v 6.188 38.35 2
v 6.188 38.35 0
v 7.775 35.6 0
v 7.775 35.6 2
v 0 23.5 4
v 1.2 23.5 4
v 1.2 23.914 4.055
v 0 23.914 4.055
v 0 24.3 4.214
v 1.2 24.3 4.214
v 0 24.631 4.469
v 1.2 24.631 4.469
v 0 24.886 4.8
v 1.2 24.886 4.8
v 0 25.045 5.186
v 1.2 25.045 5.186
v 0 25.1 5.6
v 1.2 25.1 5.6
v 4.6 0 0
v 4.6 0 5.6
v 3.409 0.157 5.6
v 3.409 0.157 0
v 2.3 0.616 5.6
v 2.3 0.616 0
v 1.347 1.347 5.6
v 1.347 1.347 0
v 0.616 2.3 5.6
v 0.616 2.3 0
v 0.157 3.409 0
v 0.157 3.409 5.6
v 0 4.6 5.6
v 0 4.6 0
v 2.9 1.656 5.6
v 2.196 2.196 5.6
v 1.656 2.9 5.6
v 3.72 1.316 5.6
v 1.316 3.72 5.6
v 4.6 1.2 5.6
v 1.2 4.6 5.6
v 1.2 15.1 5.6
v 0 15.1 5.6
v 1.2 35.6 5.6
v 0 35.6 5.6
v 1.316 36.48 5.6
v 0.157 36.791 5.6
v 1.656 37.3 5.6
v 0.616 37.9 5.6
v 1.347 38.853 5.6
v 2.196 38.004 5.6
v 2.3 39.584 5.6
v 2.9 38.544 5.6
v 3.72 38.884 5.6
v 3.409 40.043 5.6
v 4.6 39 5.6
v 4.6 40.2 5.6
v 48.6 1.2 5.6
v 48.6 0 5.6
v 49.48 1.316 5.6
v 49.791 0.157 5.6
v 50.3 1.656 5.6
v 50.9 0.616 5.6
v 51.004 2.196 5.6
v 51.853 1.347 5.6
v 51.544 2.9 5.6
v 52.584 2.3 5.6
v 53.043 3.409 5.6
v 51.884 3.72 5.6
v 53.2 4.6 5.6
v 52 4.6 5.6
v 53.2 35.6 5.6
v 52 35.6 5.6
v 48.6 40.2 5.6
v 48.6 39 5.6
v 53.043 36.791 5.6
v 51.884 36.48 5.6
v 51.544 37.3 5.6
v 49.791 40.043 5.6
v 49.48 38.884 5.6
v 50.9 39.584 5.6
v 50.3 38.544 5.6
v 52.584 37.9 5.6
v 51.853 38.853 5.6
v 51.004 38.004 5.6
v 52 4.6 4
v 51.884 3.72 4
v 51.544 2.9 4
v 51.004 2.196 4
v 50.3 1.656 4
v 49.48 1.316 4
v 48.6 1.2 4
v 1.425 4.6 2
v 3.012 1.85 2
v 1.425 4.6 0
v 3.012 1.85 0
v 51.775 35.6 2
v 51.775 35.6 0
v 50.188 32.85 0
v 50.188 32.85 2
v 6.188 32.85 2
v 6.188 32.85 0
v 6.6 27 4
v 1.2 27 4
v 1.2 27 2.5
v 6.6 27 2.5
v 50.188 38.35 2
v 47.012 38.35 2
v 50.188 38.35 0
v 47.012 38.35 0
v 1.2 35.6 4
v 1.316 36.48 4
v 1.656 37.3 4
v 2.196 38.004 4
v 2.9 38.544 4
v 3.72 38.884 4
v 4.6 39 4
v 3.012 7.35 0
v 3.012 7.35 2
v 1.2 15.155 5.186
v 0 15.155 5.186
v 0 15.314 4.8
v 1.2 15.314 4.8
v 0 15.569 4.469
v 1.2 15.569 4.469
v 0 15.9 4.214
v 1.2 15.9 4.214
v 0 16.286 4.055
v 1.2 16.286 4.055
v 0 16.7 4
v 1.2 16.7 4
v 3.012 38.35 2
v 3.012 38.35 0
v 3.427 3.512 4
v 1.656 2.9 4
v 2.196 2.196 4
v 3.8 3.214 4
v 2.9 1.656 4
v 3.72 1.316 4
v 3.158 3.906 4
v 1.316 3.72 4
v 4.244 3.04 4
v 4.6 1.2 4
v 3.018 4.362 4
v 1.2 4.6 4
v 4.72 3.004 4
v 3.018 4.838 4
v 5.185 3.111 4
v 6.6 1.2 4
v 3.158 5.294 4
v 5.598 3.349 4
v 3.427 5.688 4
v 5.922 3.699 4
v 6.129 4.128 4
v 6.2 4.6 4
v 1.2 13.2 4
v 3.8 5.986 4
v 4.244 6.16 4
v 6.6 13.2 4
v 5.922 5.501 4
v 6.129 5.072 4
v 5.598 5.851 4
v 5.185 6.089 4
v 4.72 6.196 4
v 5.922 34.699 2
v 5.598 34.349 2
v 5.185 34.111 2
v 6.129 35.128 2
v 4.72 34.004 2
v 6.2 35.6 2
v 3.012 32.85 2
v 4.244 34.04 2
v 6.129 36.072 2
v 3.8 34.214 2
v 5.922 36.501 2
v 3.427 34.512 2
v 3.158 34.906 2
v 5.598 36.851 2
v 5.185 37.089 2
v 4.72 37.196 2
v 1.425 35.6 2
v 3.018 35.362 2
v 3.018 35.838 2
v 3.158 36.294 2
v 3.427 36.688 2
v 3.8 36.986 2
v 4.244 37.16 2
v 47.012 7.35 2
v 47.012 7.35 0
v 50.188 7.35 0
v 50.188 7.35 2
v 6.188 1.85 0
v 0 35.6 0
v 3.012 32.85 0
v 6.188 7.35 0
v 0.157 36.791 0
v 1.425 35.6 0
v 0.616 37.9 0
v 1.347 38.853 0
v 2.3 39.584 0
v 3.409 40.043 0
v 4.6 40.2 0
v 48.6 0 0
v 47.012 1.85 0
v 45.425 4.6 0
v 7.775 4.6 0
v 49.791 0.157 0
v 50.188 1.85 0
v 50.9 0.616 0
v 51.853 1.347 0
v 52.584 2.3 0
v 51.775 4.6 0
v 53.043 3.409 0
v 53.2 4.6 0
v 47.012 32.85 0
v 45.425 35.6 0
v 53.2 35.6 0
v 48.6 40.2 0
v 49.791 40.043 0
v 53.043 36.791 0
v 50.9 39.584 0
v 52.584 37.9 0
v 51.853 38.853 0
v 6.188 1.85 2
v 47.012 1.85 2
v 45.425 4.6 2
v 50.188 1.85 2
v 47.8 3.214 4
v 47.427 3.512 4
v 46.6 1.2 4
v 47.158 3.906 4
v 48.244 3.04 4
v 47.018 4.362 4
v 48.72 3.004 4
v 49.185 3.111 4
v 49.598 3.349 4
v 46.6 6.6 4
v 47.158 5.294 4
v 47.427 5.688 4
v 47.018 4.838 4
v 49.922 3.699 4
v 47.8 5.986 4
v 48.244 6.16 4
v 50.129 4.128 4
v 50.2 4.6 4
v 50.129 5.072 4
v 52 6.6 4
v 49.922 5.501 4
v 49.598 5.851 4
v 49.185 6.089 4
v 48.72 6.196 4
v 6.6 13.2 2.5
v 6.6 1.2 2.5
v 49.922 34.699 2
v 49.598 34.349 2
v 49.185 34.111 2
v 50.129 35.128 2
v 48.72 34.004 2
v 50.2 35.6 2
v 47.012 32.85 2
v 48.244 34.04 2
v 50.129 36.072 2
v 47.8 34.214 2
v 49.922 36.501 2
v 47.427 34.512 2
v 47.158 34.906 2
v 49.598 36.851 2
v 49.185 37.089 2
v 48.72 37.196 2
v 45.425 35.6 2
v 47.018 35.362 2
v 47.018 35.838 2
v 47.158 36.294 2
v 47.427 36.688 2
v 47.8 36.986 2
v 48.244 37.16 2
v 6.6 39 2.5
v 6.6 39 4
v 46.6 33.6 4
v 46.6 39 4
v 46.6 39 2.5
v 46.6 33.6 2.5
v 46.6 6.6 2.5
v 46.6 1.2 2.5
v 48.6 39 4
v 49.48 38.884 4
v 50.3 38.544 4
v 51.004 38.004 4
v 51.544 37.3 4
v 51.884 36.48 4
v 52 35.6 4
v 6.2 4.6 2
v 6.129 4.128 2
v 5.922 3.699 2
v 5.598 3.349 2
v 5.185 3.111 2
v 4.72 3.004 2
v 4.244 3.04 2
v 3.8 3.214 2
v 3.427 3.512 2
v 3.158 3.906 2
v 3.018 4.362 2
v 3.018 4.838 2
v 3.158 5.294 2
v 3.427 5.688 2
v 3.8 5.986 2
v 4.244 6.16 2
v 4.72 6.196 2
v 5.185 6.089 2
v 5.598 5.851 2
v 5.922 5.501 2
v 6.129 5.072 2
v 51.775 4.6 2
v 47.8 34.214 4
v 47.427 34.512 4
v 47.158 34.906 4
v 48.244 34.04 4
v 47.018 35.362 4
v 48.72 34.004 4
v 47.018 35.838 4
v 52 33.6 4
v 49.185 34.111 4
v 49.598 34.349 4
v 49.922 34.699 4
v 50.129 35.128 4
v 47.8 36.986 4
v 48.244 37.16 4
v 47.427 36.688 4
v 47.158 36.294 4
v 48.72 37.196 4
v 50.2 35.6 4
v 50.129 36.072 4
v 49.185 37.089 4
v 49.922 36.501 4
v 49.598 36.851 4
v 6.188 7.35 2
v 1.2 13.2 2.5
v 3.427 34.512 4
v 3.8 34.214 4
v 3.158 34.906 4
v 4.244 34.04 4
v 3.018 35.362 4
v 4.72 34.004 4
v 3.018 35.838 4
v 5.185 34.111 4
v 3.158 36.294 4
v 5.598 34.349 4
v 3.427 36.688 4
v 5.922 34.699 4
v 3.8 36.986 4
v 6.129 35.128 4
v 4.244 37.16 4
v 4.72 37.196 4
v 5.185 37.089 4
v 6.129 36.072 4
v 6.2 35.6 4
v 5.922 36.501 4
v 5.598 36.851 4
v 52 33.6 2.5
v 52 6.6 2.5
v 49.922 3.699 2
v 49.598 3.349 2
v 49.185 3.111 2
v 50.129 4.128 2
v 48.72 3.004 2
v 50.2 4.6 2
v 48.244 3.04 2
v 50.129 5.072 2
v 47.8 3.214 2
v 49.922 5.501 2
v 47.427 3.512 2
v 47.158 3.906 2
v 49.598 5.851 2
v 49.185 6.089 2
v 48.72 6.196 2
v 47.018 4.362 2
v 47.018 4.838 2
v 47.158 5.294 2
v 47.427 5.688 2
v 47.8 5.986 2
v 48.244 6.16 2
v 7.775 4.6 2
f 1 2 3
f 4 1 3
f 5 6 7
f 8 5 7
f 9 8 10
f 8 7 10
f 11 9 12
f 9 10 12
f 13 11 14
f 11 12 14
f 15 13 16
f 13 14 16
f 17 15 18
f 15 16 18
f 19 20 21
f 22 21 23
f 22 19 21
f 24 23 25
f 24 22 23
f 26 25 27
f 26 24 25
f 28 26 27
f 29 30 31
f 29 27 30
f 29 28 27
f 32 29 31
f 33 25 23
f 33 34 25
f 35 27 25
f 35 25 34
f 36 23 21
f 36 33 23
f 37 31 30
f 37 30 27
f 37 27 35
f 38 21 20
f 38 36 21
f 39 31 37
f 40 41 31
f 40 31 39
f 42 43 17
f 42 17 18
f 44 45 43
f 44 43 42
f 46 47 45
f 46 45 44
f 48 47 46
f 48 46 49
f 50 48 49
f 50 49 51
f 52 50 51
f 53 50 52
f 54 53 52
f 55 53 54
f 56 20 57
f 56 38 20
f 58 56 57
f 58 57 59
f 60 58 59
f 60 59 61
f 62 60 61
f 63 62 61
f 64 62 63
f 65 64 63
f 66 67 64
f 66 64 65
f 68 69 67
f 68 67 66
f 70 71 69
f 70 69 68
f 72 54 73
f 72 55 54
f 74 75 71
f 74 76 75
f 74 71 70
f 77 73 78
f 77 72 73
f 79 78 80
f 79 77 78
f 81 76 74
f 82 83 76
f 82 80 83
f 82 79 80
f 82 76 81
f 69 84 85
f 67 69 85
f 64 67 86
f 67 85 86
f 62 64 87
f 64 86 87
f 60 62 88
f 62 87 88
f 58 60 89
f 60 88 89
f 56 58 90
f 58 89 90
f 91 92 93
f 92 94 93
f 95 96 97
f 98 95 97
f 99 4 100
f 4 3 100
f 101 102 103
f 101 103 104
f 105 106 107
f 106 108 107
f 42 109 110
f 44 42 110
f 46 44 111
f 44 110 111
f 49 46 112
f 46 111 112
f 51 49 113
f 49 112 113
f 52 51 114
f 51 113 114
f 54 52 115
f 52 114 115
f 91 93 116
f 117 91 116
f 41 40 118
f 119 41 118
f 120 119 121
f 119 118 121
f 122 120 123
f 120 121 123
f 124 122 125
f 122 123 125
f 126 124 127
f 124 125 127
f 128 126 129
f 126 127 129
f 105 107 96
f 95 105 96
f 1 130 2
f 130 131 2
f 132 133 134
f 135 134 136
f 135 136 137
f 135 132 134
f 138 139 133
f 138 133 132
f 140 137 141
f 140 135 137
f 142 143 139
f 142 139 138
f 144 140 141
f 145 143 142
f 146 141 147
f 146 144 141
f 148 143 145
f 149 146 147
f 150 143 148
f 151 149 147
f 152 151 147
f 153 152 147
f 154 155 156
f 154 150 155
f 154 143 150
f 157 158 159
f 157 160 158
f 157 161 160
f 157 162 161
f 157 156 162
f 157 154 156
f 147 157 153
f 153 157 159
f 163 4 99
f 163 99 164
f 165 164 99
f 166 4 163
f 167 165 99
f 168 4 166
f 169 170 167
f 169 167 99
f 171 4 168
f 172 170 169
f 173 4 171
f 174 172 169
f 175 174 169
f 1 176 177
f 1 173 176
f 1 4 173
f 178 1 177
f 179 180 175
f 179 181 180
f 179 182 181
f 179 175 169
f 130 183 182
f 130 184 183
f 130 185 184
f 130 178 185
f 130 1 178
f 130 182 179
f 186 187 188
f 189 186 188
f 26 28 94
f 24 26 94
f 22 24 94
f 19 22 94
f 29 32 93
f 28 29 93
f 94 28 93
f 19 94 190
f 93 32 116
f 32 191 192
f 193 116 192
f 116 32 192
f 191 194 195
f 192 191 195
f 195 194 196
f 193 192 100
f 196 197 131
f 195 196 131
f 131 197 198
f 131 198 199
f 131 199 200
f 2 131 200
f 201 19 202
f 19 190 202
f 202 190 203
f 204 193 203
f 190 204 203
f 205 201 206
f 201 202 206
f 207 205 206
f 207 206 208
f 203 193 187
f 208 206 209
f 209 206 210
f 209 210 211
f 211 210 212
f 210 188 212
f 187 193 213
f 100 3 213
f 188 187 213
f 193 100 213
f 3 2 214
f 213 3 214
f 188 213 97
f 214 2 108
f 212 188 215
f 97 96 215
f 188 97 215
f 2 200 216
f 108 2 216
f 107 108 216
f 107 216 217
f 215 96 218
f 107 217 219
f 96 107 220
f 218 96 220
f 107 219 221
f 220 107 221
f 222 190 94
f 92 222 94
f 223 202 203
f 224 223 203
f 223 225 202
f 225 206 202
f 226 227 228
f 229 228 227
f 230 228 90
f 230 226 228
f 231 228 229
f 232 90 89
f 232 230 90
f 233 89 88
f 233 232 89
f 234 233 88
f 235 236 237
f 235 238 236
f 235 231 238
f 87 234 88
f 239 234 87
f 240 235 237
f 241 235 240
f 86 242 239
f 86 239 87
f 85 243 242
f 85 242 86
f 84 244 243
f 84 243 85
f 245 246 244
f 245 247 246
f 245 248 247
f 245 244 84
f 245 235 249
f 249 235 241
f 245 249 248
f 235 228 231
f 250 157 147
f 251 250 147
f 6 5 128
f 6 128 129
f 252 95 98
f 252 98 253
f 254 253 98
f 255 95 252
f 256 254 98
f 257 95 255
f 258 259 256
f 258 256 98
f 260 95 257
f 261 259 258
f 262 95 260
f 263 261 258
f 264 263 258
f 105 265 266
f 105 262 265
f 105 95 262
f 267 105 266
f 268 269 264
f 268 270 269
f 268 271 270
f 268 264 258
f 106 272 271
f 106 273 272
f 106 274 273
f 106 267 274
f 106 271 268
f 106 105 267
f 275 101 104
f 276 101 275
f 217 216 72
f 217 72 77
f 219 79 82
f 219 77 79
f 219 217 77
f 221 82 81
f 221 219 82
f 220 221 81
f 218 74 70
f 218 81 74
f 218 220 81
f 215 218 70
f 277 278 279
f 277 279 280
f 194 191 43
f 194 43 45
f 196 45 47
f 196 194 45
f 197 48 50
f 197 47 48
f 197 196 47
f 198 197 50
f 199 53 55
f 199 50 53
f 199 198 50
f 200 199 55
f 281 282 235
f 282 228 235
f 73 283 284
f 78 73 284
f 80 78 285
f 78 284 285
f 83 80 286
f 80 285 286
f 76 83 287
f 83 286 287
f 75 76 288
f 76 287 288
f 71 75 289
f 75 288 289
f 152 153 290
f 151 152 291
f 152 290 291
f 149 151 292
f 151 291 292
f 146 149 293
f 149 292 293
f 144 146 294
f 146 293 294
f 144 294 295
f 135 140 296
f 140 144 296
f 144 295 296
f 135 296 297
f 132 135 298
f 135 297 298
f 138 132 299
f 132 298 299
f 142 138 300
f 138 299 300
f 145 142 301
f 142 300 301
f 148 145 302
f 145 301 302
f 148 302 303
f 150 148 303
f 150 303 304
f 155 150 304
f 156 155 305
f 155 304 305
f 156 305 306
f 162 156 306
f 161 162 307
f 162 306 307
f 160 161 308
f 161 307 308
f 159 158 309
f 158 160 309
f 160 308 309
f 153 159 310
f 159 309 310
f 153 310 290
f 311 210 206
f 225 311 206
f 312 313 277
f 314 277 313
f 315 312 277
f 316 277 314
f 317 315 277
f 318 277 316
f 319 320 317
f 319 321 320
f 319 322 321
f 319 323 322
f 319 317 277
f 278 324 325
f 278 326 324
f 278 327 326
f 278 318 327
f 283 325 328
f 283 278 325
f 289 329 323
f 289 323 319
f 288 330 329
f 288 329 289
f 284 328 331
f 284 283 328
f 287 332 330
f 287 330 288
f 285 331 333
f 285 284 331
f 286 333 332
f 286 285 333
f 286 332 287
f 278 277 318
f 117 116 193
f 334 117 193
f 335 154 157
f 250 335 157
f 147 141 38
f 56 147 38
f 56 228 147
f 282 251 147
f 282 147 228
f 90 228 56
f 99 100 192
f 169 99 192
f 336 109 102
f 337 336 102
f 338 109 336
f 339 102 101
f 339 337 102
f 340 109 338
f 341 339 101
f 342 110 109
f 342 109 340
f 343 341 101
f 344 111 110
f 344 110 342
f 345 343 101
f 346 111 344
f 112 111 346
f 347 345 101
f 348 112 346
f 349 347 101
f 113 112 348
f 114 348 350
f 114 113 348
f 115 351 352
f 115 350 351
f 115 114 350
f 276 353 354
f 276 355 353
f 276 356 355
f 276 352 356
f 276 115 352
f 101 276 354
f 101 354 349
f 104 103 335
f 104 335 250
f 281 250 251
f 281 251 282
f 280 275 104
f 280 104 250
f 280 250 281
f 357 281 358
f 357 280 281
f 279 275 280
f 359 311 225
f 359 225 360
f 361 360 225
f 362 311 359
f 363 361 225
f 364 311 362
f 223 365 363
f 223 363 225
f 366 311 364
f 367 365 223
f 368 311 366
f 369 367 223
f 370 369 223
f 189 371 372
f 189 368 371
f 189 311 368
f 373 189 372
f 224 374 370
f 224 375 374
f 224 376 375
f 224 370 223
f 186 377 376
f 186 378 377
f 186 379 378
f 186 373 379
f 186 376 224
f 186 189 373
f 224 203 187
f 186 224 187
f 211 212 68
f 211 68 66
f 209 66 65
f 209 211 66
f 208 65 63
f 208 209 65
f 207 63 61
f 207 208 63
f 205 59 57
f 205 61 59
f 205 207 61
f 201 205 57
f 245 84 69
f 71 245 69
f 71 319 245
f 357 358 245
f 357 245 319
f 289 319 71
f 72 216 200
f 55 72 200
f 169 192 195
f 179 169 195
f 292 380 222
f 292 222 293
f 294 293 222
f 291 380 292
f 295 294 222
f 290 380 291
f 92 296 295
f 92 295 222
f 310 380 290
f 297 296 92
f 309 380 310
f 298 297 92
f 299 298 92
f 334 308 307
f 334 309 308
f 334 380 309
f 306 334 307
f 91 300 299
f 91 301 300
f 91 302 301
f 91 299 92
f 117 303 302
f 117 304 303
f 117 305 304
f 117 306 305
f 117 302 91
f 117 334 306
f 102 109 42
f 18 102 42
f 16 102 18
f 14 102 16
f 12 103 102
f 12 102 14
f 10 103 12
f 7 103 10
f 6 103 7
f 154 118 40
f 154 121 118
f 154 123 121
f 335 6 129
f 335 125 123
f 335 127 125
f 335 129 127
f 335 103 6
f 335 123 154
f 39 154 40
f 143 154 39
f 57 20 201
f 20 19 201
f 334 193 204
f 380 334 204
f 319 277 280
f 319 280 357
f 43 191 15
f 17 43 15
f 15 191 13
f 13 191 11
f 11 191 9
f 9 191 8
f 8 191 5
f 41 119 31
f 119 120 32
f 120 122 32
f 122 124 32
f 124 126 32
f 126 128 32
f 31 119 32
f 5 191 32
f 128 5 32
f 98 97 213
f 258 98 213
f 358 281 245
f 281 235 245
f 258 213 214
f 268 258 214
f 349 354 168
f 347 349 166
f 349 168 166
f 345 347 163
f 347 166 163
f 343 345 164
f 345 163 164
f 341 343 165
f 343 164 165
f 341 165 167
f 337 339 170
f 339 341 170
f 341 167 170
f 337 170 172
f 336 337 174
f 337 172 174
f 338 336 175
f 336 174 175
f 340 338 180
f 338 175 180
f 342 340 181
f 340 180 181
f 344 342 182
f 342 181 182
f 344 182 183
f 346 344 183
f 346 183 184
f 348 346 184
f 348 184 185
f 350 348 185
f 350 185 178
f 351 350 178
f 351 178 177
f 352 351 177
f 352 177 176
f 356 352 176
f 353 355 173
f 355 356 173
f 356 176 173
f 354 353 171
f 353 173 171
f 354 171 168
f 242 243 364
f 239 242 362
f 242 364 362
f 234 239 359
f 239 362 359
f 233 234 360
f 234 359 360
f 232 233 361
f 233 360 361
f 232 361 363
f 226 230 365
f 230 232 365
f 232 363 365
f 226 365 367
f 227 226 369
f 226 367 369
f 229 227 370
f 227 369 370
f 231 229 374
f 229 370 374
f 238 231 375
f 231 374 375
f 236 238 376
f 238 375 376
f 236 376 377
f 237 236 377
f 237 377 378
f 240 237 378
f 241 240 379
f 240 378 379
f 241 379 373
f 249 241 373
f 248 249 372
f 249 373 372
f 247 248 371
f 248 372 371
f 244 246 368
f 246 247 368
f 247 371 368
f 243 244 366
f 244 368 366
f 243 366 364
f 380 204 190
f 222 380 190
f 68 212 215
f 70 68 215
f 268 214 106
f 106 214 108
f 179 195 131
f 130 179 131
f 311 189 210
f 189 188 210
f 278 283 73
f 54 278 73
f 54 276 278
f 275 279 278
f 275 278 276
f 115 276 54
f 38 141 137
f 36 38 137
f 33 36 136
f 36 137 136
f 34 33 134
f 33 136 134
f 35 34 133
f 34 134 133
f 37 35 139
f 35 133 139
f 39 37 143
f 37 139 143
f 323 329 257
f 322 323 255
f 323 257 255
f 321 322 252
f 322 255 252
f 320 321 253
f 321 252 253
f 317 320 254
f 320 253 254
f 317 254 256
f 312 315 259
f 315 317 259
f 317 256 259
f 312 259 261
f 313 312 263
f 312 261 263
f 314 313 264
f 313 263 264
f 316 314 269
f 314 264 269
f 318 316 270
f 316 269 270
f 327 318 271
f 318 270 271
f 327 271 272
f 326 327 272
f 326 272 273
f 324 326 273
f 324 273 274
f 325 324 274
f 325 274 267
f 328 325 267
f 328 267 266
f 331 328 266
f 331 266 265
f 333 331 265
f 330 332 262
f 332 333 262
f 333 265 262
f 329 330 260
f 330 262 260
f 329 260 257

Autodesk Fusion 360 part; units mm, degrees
sketch "Sketch1" plane through (0, 0, 0) normal (0, 0, 1) x (1, 0, 0)
  line L0 (0, 0) -> (53.2, 0)
  line L1 (53.2, 0) -> (53.2, 40.2)
  line L2 (53.2, 40.2) -> (0, 40.2)
  line L3 (0, 40.2) -> (0, 0)
  circle A0 centre (4.6, 35.6) radius 1.6
  circle A1 centre (4.6, 4.6) radius 1.6
  circle A2 centre (48.6, 35.6) radius 1.6
  circle A3 centre (48.6, 4.6) radius 1.6
  dimension "d1" = 53.2
  dimension "d2" = 40.2
  dimension "d3" = 3.2
  dimension "d4" = 3.2
  dimension "d5" = 3.2
  dimension "d6" = 3.2
  dimension "d7" = 4.6
  dimension "d8" = 4.6
  dimension "d9" = 4.6
  dimension "d10" = 4.6
  dimension "d11" = 4.6
  dimension "d12" = 4.6
  dimension "d13" = 4.6
  dimension "d14" = 4.6
extrude "Extrude1" add sketch "Sketch1" along normal blind 4
sketch "Sketch2" plane through (0, 0, 0) normal (0, 0, -1) x (-1, 0, 0)
  circle A0 centre (-48.6, 4.6) radius 1.6
  circle A1 centre (-4.6, 4.6) radius 1.6
  circle A2 centre (-48.6, 35.6) radius 1.6
  circle A3 centre (-4.6, 35.6) radius 1.6
  line L0 (0, 0) -> (0, 40.2)
  line L1 (0, 40.2) -> (-53.2, 40.2)
  line L2 (-53.2, 40.2) -> (-53.2, 0)
  line L3 (-53.2, 0) -> (0, 0)
  line L4 (-3.0123, 32.85) -> (-1.4246, 35.6)
  line L5 (-1.4246, 35.6) -> (-3.0123, 38.35)
  line L6 (-3.0123, 38.35) -> (-6.1877, 38.35)
  line L7 (-6.1877, 38.35) -> (-7.7754, 35.6)
  line L8 (-7.7754, 35.6) -> (-6.1877, 32.85)
  line L9 (-6.1877, 32.85) -> (-3.0123, 32.85)
  line L10 (-47.0123, 32.85) -> (-45.4246, 35.6)
  line L11 (-45.4246, 35.6) -> (-47.0123, 38.35)
  line L12 (-47.0123, 38.35) -> (-50.1877, 38.35)
  line L13 (-50.1877, 38.35) -> (-51.7754, 35.6)
  line L14 (-51.7754, 35.6) -> (-50.1877, 32.85)
  line L15 (-50.1877, 32.85) -> (-47.0123, 32.85)
  line L16 (-50.1877, 7.35) -> (-51.7754, 4.6)
  line L17 (-51.7754, 4.6) -> (-50.1877, 1.85)
  line L18 (-50.1877, 1.85) -> (-47.0123, 1.85)
  line L19 (-47.0123, 1.85) -> (-45.4246, 4.6)
  line L20 (-45.4246, 4.6) -> (-47.0123, 7.35)
  line L21 (-47.0123, 7.35) -> (-50.1877, 7.35)
  line L22 (-6.1877, 7.35) -> (-7.7754, 4.6)
  line L23 (-7.7754, 4.6) -> (-6.1877, 1.85)
  line L24 (-6.1877, 1.85) -> (-3.0123, 1.85)
  line L25 (-3.0123, 1.85) -> (-1.4246, 4.6)
  line L26 (-1.4246, 4.6) -> (-3.0123, 7.35)
  line L27 (-3.0123, 7.35) -> (-6.1877, 7.35)
  dimension "d17" = 2.75
  dimension "d18" = 2.75
  dimension "d19" = 2.75
  dimension "d20" = 2.75
extrude "Extrude2" cut sketch "Sketch2" against normal blind 2 contours L4 L5 L6 L7 L8 L9 | L10 L11 L12 L13 L14 L15 | L16 L17 L18 L19 L20 L21 | L22 L23 L24 L25 L26 L27
fillet "Fillet1" radius 4.6 4 edges at (53.2, 40.2, 2) (53.2, 0, 2) (0, 0, 2) (0, 40.2, 2)
sketch "Sketch4" plane through (0, 0, 4) normal (0, 0, 1) x (1, 0, 0)
  arc A0 (4.6, 40.2) -> (0, 35.6) centre (4.6, 35.6) ccw
  line L0 (0, 35.6) -> (0, 4.6)
  arc A1 (0, 4.6) -> (4.6, 0) centre (4.6, 4.6) ccw
  line L1 (4.6, 0) -> (48.6, 0)
  arc A2 (48.6, 0) -> (53.2, 4.6) centre (48.6, 4.6) ccw
  line L2 (53.2, 4.6) -> (53.2, 35.6)
  arc A3 (53.2, 35.6) -> (48.6, 40.2) centre (48.6, 35.6) ccw
  line L3 (48.6, 40.2) -> (4.6, 40.2)
  circle A4 centre (4.6, 4.6) radius 1.6
  circle A5 centre (48.6, 35.6) radius 1.6
  circle A6 centre (4.6, 35.6) radius 1.6
  circle A7 centre (48.6, 4.6) radius 1.6
  line L4 (1.2, 35.6) -> (1.2, 4.6)
  arc A8 (1.2, 4.6) -> (4.6, 1.2) centre (4.6, 4.6) ccw
  line L5 (4.6, 1.2) -> (48.6, 1.2)
  arc A9 (48.6, 1.2) -> (52, 4.6) centre (48.6, 4.6) ccw
  line L6 (52, 4.6) -> (52, 35.6)
  arc A10 (52, 35.6) -> (48.6, 39) centre (48.6, 35.6) ccw
  line L7 (48.6, 39) -> (4.6, 39)
  arc A11 (4.6, 39) -> (1.2, 35.6) centre (4.6, 35.6) ccw
  dimension "d24" = 1.2
extrude "Extrude3" add sketch "Sketch4" along normal blind 1.6 contours A0 L0 A1 L1 A2 L2 A3 L3
sketch "Sketch5" plane through (0, 0, 4) normal (0, 0, 1) x (1, 0, 0)
  line L0 (1.2, 35.6) -> (1.2, 4.6)
  arc A0 (1.2, 4.6) -> (4.6, 1.2) centre (4.6, 4.6) ccw
  line L1 (4.6, 1.2) -> (48.6, 1.2)
  arc A1 (48.6, 1.2) -> (52, 4.6) centre (48.6, 4.6) ccw
  line L2 (52, 4.6) -> (52, 35.6)
  arc A2 (52, 35.6) -> (48.6, 39) centre (48.6, 35.6) ccw
  line L3 (48.6, 39) -> (4.6, 39)
  arc A3 (4.6, 39) -> (1.2, 35.6) centre (4.6, 35.6) ccw
  circle A4 centre (4.6, 4.6) radius 1.6
  circle A5 centre (48.6, 35.6) radius 1.6
  circle A6 centre (4.6, 35.6) radius 1.6
  circle A7 centre (48.6, 4.6) radius 1.6
  line L4 (1.2, 13.2) -> (6.6, 13.2)
  line L5 (6.6, 13.2) -> (6.6, 1.2)
  line L6 (46.6, 1.2) -> (46.6, 6.6)
  line L7 (46.6, 6.6) -> (52, 6.6)
  line L8 (1.2, 27) -> (6.6, 27)
  line L9 (6.6, 27) -> (6.6, 39)
  line L10 (46.6, 39) -> (46.6, 33.6)
  line L11 (46.6, 33.6) -> (52, 33.6)
  dimension "d27" = 12
  dimension "d28" = 5.4
  dimension "d29" = 5.4
  dimension "d30" = 12
  dimension "d31" = 5.4
  dimension "d32" = 5.4
  dimension "d33" = 5.4
  dimension "d34" = 5.4
extrude "Extrude4" cut sketch "Sketch5" against normal blind 1.5 contours L0 L1 L2 L3 L4 L5 L6 L7 L8 L9 L10 L11
sketch "Sketch6" plane through (0, 0, 5.6) normal (0, 0, 1) x (1, 0, 0)
  arc A0 (4.6, 39) -> (1.2, 35.6) centre (4.6, 35.6) ccw
  line L0 (4.6, 39) -> (48.6, 39)
  arc A1 (52, 35.6) -> (48.6, 39) centre (48.6, 35.6) ccw
  line L1 (52, 35.6) -> (52, 4.6)
  arc A2 (48.6, 1.2) -> (52, 4.6) centre (48.6, 4.6) ccw
  line L2 (48.6, 1.2) -> (4.6, 1.2)
  arc A3 (1.2, 4.6) -> (4.6, 1.2) centre (4.6, 4.6) ccw
  line L3 (1.2, 4.6) -> (1.2, 35.6)
  line L4 (48.6, 40.2) -> (4.6, 40.2)
  arc A4 (4.6, 40.2) -> (0, 35.6) centre (4.6, 35.6) ccw
  line L5 (0, 35.6) -> (0, 4.6)
  arc A5 (0, 4.6) -> (4.6, 0) centre (4.6, 4.6) ccw
  line L6 (4.6, 0) -> (48.6, 0)
  arc A6 (48.6, 0) -> (53.2, 4.6) centre (48.6, 4.6) ccw
  line L7 (53.2, 4.6) -> (53.2, 35.6)
  arc A7 (53.2, 35.6) -> (48.6, 40.2) centre (48.6, 35.6) ccw
  line L8 (0, 25.1) -> (1.2, 25.1)
  line L9 (0, 15.1) -> (1.2, 15.1)
  dimension "d37" = 10
  dimension "d38" = 10.5
extrude "Extrude5" cut sketch "Sketch6" against normal blind 1.6 contours L3 L5 L8 L9
fillet "Fillet2" radius 1.6 2 edges at (0.6, 25.1, 4) (0.6, 15.1, 4)
equation "d1 = 50 mm + ( ( 2 * 1.6 ) * 1 mm )"
equation "d2 = 37 mm + ( ( 2 * 1.6 ) * 1 mm )"
equation "d7 = 3 mm + 1.6 mm"
equation "d8 = d7"
equation "d9 = d7"
equation "d10 = d7"
equation "d11 = d7"
equation "d12 = d7"
equation "d13 = d7"
equation "d14 = d7"
equation "d17 = ( 5.5 / 2 ) * 1 mm"
equation "d18 = d17"
equation "d19 = d17"
equation "d20 = d17"
equation "d23 = 3 mm + 1.6 mm"
equation "d28 = 5 mm + 0.4 mm"
equation "d29 = d28"
equation "d30 = d27"
equation "d31 = d34"
equation "d32 = d28"
equation "d33 = d32"
